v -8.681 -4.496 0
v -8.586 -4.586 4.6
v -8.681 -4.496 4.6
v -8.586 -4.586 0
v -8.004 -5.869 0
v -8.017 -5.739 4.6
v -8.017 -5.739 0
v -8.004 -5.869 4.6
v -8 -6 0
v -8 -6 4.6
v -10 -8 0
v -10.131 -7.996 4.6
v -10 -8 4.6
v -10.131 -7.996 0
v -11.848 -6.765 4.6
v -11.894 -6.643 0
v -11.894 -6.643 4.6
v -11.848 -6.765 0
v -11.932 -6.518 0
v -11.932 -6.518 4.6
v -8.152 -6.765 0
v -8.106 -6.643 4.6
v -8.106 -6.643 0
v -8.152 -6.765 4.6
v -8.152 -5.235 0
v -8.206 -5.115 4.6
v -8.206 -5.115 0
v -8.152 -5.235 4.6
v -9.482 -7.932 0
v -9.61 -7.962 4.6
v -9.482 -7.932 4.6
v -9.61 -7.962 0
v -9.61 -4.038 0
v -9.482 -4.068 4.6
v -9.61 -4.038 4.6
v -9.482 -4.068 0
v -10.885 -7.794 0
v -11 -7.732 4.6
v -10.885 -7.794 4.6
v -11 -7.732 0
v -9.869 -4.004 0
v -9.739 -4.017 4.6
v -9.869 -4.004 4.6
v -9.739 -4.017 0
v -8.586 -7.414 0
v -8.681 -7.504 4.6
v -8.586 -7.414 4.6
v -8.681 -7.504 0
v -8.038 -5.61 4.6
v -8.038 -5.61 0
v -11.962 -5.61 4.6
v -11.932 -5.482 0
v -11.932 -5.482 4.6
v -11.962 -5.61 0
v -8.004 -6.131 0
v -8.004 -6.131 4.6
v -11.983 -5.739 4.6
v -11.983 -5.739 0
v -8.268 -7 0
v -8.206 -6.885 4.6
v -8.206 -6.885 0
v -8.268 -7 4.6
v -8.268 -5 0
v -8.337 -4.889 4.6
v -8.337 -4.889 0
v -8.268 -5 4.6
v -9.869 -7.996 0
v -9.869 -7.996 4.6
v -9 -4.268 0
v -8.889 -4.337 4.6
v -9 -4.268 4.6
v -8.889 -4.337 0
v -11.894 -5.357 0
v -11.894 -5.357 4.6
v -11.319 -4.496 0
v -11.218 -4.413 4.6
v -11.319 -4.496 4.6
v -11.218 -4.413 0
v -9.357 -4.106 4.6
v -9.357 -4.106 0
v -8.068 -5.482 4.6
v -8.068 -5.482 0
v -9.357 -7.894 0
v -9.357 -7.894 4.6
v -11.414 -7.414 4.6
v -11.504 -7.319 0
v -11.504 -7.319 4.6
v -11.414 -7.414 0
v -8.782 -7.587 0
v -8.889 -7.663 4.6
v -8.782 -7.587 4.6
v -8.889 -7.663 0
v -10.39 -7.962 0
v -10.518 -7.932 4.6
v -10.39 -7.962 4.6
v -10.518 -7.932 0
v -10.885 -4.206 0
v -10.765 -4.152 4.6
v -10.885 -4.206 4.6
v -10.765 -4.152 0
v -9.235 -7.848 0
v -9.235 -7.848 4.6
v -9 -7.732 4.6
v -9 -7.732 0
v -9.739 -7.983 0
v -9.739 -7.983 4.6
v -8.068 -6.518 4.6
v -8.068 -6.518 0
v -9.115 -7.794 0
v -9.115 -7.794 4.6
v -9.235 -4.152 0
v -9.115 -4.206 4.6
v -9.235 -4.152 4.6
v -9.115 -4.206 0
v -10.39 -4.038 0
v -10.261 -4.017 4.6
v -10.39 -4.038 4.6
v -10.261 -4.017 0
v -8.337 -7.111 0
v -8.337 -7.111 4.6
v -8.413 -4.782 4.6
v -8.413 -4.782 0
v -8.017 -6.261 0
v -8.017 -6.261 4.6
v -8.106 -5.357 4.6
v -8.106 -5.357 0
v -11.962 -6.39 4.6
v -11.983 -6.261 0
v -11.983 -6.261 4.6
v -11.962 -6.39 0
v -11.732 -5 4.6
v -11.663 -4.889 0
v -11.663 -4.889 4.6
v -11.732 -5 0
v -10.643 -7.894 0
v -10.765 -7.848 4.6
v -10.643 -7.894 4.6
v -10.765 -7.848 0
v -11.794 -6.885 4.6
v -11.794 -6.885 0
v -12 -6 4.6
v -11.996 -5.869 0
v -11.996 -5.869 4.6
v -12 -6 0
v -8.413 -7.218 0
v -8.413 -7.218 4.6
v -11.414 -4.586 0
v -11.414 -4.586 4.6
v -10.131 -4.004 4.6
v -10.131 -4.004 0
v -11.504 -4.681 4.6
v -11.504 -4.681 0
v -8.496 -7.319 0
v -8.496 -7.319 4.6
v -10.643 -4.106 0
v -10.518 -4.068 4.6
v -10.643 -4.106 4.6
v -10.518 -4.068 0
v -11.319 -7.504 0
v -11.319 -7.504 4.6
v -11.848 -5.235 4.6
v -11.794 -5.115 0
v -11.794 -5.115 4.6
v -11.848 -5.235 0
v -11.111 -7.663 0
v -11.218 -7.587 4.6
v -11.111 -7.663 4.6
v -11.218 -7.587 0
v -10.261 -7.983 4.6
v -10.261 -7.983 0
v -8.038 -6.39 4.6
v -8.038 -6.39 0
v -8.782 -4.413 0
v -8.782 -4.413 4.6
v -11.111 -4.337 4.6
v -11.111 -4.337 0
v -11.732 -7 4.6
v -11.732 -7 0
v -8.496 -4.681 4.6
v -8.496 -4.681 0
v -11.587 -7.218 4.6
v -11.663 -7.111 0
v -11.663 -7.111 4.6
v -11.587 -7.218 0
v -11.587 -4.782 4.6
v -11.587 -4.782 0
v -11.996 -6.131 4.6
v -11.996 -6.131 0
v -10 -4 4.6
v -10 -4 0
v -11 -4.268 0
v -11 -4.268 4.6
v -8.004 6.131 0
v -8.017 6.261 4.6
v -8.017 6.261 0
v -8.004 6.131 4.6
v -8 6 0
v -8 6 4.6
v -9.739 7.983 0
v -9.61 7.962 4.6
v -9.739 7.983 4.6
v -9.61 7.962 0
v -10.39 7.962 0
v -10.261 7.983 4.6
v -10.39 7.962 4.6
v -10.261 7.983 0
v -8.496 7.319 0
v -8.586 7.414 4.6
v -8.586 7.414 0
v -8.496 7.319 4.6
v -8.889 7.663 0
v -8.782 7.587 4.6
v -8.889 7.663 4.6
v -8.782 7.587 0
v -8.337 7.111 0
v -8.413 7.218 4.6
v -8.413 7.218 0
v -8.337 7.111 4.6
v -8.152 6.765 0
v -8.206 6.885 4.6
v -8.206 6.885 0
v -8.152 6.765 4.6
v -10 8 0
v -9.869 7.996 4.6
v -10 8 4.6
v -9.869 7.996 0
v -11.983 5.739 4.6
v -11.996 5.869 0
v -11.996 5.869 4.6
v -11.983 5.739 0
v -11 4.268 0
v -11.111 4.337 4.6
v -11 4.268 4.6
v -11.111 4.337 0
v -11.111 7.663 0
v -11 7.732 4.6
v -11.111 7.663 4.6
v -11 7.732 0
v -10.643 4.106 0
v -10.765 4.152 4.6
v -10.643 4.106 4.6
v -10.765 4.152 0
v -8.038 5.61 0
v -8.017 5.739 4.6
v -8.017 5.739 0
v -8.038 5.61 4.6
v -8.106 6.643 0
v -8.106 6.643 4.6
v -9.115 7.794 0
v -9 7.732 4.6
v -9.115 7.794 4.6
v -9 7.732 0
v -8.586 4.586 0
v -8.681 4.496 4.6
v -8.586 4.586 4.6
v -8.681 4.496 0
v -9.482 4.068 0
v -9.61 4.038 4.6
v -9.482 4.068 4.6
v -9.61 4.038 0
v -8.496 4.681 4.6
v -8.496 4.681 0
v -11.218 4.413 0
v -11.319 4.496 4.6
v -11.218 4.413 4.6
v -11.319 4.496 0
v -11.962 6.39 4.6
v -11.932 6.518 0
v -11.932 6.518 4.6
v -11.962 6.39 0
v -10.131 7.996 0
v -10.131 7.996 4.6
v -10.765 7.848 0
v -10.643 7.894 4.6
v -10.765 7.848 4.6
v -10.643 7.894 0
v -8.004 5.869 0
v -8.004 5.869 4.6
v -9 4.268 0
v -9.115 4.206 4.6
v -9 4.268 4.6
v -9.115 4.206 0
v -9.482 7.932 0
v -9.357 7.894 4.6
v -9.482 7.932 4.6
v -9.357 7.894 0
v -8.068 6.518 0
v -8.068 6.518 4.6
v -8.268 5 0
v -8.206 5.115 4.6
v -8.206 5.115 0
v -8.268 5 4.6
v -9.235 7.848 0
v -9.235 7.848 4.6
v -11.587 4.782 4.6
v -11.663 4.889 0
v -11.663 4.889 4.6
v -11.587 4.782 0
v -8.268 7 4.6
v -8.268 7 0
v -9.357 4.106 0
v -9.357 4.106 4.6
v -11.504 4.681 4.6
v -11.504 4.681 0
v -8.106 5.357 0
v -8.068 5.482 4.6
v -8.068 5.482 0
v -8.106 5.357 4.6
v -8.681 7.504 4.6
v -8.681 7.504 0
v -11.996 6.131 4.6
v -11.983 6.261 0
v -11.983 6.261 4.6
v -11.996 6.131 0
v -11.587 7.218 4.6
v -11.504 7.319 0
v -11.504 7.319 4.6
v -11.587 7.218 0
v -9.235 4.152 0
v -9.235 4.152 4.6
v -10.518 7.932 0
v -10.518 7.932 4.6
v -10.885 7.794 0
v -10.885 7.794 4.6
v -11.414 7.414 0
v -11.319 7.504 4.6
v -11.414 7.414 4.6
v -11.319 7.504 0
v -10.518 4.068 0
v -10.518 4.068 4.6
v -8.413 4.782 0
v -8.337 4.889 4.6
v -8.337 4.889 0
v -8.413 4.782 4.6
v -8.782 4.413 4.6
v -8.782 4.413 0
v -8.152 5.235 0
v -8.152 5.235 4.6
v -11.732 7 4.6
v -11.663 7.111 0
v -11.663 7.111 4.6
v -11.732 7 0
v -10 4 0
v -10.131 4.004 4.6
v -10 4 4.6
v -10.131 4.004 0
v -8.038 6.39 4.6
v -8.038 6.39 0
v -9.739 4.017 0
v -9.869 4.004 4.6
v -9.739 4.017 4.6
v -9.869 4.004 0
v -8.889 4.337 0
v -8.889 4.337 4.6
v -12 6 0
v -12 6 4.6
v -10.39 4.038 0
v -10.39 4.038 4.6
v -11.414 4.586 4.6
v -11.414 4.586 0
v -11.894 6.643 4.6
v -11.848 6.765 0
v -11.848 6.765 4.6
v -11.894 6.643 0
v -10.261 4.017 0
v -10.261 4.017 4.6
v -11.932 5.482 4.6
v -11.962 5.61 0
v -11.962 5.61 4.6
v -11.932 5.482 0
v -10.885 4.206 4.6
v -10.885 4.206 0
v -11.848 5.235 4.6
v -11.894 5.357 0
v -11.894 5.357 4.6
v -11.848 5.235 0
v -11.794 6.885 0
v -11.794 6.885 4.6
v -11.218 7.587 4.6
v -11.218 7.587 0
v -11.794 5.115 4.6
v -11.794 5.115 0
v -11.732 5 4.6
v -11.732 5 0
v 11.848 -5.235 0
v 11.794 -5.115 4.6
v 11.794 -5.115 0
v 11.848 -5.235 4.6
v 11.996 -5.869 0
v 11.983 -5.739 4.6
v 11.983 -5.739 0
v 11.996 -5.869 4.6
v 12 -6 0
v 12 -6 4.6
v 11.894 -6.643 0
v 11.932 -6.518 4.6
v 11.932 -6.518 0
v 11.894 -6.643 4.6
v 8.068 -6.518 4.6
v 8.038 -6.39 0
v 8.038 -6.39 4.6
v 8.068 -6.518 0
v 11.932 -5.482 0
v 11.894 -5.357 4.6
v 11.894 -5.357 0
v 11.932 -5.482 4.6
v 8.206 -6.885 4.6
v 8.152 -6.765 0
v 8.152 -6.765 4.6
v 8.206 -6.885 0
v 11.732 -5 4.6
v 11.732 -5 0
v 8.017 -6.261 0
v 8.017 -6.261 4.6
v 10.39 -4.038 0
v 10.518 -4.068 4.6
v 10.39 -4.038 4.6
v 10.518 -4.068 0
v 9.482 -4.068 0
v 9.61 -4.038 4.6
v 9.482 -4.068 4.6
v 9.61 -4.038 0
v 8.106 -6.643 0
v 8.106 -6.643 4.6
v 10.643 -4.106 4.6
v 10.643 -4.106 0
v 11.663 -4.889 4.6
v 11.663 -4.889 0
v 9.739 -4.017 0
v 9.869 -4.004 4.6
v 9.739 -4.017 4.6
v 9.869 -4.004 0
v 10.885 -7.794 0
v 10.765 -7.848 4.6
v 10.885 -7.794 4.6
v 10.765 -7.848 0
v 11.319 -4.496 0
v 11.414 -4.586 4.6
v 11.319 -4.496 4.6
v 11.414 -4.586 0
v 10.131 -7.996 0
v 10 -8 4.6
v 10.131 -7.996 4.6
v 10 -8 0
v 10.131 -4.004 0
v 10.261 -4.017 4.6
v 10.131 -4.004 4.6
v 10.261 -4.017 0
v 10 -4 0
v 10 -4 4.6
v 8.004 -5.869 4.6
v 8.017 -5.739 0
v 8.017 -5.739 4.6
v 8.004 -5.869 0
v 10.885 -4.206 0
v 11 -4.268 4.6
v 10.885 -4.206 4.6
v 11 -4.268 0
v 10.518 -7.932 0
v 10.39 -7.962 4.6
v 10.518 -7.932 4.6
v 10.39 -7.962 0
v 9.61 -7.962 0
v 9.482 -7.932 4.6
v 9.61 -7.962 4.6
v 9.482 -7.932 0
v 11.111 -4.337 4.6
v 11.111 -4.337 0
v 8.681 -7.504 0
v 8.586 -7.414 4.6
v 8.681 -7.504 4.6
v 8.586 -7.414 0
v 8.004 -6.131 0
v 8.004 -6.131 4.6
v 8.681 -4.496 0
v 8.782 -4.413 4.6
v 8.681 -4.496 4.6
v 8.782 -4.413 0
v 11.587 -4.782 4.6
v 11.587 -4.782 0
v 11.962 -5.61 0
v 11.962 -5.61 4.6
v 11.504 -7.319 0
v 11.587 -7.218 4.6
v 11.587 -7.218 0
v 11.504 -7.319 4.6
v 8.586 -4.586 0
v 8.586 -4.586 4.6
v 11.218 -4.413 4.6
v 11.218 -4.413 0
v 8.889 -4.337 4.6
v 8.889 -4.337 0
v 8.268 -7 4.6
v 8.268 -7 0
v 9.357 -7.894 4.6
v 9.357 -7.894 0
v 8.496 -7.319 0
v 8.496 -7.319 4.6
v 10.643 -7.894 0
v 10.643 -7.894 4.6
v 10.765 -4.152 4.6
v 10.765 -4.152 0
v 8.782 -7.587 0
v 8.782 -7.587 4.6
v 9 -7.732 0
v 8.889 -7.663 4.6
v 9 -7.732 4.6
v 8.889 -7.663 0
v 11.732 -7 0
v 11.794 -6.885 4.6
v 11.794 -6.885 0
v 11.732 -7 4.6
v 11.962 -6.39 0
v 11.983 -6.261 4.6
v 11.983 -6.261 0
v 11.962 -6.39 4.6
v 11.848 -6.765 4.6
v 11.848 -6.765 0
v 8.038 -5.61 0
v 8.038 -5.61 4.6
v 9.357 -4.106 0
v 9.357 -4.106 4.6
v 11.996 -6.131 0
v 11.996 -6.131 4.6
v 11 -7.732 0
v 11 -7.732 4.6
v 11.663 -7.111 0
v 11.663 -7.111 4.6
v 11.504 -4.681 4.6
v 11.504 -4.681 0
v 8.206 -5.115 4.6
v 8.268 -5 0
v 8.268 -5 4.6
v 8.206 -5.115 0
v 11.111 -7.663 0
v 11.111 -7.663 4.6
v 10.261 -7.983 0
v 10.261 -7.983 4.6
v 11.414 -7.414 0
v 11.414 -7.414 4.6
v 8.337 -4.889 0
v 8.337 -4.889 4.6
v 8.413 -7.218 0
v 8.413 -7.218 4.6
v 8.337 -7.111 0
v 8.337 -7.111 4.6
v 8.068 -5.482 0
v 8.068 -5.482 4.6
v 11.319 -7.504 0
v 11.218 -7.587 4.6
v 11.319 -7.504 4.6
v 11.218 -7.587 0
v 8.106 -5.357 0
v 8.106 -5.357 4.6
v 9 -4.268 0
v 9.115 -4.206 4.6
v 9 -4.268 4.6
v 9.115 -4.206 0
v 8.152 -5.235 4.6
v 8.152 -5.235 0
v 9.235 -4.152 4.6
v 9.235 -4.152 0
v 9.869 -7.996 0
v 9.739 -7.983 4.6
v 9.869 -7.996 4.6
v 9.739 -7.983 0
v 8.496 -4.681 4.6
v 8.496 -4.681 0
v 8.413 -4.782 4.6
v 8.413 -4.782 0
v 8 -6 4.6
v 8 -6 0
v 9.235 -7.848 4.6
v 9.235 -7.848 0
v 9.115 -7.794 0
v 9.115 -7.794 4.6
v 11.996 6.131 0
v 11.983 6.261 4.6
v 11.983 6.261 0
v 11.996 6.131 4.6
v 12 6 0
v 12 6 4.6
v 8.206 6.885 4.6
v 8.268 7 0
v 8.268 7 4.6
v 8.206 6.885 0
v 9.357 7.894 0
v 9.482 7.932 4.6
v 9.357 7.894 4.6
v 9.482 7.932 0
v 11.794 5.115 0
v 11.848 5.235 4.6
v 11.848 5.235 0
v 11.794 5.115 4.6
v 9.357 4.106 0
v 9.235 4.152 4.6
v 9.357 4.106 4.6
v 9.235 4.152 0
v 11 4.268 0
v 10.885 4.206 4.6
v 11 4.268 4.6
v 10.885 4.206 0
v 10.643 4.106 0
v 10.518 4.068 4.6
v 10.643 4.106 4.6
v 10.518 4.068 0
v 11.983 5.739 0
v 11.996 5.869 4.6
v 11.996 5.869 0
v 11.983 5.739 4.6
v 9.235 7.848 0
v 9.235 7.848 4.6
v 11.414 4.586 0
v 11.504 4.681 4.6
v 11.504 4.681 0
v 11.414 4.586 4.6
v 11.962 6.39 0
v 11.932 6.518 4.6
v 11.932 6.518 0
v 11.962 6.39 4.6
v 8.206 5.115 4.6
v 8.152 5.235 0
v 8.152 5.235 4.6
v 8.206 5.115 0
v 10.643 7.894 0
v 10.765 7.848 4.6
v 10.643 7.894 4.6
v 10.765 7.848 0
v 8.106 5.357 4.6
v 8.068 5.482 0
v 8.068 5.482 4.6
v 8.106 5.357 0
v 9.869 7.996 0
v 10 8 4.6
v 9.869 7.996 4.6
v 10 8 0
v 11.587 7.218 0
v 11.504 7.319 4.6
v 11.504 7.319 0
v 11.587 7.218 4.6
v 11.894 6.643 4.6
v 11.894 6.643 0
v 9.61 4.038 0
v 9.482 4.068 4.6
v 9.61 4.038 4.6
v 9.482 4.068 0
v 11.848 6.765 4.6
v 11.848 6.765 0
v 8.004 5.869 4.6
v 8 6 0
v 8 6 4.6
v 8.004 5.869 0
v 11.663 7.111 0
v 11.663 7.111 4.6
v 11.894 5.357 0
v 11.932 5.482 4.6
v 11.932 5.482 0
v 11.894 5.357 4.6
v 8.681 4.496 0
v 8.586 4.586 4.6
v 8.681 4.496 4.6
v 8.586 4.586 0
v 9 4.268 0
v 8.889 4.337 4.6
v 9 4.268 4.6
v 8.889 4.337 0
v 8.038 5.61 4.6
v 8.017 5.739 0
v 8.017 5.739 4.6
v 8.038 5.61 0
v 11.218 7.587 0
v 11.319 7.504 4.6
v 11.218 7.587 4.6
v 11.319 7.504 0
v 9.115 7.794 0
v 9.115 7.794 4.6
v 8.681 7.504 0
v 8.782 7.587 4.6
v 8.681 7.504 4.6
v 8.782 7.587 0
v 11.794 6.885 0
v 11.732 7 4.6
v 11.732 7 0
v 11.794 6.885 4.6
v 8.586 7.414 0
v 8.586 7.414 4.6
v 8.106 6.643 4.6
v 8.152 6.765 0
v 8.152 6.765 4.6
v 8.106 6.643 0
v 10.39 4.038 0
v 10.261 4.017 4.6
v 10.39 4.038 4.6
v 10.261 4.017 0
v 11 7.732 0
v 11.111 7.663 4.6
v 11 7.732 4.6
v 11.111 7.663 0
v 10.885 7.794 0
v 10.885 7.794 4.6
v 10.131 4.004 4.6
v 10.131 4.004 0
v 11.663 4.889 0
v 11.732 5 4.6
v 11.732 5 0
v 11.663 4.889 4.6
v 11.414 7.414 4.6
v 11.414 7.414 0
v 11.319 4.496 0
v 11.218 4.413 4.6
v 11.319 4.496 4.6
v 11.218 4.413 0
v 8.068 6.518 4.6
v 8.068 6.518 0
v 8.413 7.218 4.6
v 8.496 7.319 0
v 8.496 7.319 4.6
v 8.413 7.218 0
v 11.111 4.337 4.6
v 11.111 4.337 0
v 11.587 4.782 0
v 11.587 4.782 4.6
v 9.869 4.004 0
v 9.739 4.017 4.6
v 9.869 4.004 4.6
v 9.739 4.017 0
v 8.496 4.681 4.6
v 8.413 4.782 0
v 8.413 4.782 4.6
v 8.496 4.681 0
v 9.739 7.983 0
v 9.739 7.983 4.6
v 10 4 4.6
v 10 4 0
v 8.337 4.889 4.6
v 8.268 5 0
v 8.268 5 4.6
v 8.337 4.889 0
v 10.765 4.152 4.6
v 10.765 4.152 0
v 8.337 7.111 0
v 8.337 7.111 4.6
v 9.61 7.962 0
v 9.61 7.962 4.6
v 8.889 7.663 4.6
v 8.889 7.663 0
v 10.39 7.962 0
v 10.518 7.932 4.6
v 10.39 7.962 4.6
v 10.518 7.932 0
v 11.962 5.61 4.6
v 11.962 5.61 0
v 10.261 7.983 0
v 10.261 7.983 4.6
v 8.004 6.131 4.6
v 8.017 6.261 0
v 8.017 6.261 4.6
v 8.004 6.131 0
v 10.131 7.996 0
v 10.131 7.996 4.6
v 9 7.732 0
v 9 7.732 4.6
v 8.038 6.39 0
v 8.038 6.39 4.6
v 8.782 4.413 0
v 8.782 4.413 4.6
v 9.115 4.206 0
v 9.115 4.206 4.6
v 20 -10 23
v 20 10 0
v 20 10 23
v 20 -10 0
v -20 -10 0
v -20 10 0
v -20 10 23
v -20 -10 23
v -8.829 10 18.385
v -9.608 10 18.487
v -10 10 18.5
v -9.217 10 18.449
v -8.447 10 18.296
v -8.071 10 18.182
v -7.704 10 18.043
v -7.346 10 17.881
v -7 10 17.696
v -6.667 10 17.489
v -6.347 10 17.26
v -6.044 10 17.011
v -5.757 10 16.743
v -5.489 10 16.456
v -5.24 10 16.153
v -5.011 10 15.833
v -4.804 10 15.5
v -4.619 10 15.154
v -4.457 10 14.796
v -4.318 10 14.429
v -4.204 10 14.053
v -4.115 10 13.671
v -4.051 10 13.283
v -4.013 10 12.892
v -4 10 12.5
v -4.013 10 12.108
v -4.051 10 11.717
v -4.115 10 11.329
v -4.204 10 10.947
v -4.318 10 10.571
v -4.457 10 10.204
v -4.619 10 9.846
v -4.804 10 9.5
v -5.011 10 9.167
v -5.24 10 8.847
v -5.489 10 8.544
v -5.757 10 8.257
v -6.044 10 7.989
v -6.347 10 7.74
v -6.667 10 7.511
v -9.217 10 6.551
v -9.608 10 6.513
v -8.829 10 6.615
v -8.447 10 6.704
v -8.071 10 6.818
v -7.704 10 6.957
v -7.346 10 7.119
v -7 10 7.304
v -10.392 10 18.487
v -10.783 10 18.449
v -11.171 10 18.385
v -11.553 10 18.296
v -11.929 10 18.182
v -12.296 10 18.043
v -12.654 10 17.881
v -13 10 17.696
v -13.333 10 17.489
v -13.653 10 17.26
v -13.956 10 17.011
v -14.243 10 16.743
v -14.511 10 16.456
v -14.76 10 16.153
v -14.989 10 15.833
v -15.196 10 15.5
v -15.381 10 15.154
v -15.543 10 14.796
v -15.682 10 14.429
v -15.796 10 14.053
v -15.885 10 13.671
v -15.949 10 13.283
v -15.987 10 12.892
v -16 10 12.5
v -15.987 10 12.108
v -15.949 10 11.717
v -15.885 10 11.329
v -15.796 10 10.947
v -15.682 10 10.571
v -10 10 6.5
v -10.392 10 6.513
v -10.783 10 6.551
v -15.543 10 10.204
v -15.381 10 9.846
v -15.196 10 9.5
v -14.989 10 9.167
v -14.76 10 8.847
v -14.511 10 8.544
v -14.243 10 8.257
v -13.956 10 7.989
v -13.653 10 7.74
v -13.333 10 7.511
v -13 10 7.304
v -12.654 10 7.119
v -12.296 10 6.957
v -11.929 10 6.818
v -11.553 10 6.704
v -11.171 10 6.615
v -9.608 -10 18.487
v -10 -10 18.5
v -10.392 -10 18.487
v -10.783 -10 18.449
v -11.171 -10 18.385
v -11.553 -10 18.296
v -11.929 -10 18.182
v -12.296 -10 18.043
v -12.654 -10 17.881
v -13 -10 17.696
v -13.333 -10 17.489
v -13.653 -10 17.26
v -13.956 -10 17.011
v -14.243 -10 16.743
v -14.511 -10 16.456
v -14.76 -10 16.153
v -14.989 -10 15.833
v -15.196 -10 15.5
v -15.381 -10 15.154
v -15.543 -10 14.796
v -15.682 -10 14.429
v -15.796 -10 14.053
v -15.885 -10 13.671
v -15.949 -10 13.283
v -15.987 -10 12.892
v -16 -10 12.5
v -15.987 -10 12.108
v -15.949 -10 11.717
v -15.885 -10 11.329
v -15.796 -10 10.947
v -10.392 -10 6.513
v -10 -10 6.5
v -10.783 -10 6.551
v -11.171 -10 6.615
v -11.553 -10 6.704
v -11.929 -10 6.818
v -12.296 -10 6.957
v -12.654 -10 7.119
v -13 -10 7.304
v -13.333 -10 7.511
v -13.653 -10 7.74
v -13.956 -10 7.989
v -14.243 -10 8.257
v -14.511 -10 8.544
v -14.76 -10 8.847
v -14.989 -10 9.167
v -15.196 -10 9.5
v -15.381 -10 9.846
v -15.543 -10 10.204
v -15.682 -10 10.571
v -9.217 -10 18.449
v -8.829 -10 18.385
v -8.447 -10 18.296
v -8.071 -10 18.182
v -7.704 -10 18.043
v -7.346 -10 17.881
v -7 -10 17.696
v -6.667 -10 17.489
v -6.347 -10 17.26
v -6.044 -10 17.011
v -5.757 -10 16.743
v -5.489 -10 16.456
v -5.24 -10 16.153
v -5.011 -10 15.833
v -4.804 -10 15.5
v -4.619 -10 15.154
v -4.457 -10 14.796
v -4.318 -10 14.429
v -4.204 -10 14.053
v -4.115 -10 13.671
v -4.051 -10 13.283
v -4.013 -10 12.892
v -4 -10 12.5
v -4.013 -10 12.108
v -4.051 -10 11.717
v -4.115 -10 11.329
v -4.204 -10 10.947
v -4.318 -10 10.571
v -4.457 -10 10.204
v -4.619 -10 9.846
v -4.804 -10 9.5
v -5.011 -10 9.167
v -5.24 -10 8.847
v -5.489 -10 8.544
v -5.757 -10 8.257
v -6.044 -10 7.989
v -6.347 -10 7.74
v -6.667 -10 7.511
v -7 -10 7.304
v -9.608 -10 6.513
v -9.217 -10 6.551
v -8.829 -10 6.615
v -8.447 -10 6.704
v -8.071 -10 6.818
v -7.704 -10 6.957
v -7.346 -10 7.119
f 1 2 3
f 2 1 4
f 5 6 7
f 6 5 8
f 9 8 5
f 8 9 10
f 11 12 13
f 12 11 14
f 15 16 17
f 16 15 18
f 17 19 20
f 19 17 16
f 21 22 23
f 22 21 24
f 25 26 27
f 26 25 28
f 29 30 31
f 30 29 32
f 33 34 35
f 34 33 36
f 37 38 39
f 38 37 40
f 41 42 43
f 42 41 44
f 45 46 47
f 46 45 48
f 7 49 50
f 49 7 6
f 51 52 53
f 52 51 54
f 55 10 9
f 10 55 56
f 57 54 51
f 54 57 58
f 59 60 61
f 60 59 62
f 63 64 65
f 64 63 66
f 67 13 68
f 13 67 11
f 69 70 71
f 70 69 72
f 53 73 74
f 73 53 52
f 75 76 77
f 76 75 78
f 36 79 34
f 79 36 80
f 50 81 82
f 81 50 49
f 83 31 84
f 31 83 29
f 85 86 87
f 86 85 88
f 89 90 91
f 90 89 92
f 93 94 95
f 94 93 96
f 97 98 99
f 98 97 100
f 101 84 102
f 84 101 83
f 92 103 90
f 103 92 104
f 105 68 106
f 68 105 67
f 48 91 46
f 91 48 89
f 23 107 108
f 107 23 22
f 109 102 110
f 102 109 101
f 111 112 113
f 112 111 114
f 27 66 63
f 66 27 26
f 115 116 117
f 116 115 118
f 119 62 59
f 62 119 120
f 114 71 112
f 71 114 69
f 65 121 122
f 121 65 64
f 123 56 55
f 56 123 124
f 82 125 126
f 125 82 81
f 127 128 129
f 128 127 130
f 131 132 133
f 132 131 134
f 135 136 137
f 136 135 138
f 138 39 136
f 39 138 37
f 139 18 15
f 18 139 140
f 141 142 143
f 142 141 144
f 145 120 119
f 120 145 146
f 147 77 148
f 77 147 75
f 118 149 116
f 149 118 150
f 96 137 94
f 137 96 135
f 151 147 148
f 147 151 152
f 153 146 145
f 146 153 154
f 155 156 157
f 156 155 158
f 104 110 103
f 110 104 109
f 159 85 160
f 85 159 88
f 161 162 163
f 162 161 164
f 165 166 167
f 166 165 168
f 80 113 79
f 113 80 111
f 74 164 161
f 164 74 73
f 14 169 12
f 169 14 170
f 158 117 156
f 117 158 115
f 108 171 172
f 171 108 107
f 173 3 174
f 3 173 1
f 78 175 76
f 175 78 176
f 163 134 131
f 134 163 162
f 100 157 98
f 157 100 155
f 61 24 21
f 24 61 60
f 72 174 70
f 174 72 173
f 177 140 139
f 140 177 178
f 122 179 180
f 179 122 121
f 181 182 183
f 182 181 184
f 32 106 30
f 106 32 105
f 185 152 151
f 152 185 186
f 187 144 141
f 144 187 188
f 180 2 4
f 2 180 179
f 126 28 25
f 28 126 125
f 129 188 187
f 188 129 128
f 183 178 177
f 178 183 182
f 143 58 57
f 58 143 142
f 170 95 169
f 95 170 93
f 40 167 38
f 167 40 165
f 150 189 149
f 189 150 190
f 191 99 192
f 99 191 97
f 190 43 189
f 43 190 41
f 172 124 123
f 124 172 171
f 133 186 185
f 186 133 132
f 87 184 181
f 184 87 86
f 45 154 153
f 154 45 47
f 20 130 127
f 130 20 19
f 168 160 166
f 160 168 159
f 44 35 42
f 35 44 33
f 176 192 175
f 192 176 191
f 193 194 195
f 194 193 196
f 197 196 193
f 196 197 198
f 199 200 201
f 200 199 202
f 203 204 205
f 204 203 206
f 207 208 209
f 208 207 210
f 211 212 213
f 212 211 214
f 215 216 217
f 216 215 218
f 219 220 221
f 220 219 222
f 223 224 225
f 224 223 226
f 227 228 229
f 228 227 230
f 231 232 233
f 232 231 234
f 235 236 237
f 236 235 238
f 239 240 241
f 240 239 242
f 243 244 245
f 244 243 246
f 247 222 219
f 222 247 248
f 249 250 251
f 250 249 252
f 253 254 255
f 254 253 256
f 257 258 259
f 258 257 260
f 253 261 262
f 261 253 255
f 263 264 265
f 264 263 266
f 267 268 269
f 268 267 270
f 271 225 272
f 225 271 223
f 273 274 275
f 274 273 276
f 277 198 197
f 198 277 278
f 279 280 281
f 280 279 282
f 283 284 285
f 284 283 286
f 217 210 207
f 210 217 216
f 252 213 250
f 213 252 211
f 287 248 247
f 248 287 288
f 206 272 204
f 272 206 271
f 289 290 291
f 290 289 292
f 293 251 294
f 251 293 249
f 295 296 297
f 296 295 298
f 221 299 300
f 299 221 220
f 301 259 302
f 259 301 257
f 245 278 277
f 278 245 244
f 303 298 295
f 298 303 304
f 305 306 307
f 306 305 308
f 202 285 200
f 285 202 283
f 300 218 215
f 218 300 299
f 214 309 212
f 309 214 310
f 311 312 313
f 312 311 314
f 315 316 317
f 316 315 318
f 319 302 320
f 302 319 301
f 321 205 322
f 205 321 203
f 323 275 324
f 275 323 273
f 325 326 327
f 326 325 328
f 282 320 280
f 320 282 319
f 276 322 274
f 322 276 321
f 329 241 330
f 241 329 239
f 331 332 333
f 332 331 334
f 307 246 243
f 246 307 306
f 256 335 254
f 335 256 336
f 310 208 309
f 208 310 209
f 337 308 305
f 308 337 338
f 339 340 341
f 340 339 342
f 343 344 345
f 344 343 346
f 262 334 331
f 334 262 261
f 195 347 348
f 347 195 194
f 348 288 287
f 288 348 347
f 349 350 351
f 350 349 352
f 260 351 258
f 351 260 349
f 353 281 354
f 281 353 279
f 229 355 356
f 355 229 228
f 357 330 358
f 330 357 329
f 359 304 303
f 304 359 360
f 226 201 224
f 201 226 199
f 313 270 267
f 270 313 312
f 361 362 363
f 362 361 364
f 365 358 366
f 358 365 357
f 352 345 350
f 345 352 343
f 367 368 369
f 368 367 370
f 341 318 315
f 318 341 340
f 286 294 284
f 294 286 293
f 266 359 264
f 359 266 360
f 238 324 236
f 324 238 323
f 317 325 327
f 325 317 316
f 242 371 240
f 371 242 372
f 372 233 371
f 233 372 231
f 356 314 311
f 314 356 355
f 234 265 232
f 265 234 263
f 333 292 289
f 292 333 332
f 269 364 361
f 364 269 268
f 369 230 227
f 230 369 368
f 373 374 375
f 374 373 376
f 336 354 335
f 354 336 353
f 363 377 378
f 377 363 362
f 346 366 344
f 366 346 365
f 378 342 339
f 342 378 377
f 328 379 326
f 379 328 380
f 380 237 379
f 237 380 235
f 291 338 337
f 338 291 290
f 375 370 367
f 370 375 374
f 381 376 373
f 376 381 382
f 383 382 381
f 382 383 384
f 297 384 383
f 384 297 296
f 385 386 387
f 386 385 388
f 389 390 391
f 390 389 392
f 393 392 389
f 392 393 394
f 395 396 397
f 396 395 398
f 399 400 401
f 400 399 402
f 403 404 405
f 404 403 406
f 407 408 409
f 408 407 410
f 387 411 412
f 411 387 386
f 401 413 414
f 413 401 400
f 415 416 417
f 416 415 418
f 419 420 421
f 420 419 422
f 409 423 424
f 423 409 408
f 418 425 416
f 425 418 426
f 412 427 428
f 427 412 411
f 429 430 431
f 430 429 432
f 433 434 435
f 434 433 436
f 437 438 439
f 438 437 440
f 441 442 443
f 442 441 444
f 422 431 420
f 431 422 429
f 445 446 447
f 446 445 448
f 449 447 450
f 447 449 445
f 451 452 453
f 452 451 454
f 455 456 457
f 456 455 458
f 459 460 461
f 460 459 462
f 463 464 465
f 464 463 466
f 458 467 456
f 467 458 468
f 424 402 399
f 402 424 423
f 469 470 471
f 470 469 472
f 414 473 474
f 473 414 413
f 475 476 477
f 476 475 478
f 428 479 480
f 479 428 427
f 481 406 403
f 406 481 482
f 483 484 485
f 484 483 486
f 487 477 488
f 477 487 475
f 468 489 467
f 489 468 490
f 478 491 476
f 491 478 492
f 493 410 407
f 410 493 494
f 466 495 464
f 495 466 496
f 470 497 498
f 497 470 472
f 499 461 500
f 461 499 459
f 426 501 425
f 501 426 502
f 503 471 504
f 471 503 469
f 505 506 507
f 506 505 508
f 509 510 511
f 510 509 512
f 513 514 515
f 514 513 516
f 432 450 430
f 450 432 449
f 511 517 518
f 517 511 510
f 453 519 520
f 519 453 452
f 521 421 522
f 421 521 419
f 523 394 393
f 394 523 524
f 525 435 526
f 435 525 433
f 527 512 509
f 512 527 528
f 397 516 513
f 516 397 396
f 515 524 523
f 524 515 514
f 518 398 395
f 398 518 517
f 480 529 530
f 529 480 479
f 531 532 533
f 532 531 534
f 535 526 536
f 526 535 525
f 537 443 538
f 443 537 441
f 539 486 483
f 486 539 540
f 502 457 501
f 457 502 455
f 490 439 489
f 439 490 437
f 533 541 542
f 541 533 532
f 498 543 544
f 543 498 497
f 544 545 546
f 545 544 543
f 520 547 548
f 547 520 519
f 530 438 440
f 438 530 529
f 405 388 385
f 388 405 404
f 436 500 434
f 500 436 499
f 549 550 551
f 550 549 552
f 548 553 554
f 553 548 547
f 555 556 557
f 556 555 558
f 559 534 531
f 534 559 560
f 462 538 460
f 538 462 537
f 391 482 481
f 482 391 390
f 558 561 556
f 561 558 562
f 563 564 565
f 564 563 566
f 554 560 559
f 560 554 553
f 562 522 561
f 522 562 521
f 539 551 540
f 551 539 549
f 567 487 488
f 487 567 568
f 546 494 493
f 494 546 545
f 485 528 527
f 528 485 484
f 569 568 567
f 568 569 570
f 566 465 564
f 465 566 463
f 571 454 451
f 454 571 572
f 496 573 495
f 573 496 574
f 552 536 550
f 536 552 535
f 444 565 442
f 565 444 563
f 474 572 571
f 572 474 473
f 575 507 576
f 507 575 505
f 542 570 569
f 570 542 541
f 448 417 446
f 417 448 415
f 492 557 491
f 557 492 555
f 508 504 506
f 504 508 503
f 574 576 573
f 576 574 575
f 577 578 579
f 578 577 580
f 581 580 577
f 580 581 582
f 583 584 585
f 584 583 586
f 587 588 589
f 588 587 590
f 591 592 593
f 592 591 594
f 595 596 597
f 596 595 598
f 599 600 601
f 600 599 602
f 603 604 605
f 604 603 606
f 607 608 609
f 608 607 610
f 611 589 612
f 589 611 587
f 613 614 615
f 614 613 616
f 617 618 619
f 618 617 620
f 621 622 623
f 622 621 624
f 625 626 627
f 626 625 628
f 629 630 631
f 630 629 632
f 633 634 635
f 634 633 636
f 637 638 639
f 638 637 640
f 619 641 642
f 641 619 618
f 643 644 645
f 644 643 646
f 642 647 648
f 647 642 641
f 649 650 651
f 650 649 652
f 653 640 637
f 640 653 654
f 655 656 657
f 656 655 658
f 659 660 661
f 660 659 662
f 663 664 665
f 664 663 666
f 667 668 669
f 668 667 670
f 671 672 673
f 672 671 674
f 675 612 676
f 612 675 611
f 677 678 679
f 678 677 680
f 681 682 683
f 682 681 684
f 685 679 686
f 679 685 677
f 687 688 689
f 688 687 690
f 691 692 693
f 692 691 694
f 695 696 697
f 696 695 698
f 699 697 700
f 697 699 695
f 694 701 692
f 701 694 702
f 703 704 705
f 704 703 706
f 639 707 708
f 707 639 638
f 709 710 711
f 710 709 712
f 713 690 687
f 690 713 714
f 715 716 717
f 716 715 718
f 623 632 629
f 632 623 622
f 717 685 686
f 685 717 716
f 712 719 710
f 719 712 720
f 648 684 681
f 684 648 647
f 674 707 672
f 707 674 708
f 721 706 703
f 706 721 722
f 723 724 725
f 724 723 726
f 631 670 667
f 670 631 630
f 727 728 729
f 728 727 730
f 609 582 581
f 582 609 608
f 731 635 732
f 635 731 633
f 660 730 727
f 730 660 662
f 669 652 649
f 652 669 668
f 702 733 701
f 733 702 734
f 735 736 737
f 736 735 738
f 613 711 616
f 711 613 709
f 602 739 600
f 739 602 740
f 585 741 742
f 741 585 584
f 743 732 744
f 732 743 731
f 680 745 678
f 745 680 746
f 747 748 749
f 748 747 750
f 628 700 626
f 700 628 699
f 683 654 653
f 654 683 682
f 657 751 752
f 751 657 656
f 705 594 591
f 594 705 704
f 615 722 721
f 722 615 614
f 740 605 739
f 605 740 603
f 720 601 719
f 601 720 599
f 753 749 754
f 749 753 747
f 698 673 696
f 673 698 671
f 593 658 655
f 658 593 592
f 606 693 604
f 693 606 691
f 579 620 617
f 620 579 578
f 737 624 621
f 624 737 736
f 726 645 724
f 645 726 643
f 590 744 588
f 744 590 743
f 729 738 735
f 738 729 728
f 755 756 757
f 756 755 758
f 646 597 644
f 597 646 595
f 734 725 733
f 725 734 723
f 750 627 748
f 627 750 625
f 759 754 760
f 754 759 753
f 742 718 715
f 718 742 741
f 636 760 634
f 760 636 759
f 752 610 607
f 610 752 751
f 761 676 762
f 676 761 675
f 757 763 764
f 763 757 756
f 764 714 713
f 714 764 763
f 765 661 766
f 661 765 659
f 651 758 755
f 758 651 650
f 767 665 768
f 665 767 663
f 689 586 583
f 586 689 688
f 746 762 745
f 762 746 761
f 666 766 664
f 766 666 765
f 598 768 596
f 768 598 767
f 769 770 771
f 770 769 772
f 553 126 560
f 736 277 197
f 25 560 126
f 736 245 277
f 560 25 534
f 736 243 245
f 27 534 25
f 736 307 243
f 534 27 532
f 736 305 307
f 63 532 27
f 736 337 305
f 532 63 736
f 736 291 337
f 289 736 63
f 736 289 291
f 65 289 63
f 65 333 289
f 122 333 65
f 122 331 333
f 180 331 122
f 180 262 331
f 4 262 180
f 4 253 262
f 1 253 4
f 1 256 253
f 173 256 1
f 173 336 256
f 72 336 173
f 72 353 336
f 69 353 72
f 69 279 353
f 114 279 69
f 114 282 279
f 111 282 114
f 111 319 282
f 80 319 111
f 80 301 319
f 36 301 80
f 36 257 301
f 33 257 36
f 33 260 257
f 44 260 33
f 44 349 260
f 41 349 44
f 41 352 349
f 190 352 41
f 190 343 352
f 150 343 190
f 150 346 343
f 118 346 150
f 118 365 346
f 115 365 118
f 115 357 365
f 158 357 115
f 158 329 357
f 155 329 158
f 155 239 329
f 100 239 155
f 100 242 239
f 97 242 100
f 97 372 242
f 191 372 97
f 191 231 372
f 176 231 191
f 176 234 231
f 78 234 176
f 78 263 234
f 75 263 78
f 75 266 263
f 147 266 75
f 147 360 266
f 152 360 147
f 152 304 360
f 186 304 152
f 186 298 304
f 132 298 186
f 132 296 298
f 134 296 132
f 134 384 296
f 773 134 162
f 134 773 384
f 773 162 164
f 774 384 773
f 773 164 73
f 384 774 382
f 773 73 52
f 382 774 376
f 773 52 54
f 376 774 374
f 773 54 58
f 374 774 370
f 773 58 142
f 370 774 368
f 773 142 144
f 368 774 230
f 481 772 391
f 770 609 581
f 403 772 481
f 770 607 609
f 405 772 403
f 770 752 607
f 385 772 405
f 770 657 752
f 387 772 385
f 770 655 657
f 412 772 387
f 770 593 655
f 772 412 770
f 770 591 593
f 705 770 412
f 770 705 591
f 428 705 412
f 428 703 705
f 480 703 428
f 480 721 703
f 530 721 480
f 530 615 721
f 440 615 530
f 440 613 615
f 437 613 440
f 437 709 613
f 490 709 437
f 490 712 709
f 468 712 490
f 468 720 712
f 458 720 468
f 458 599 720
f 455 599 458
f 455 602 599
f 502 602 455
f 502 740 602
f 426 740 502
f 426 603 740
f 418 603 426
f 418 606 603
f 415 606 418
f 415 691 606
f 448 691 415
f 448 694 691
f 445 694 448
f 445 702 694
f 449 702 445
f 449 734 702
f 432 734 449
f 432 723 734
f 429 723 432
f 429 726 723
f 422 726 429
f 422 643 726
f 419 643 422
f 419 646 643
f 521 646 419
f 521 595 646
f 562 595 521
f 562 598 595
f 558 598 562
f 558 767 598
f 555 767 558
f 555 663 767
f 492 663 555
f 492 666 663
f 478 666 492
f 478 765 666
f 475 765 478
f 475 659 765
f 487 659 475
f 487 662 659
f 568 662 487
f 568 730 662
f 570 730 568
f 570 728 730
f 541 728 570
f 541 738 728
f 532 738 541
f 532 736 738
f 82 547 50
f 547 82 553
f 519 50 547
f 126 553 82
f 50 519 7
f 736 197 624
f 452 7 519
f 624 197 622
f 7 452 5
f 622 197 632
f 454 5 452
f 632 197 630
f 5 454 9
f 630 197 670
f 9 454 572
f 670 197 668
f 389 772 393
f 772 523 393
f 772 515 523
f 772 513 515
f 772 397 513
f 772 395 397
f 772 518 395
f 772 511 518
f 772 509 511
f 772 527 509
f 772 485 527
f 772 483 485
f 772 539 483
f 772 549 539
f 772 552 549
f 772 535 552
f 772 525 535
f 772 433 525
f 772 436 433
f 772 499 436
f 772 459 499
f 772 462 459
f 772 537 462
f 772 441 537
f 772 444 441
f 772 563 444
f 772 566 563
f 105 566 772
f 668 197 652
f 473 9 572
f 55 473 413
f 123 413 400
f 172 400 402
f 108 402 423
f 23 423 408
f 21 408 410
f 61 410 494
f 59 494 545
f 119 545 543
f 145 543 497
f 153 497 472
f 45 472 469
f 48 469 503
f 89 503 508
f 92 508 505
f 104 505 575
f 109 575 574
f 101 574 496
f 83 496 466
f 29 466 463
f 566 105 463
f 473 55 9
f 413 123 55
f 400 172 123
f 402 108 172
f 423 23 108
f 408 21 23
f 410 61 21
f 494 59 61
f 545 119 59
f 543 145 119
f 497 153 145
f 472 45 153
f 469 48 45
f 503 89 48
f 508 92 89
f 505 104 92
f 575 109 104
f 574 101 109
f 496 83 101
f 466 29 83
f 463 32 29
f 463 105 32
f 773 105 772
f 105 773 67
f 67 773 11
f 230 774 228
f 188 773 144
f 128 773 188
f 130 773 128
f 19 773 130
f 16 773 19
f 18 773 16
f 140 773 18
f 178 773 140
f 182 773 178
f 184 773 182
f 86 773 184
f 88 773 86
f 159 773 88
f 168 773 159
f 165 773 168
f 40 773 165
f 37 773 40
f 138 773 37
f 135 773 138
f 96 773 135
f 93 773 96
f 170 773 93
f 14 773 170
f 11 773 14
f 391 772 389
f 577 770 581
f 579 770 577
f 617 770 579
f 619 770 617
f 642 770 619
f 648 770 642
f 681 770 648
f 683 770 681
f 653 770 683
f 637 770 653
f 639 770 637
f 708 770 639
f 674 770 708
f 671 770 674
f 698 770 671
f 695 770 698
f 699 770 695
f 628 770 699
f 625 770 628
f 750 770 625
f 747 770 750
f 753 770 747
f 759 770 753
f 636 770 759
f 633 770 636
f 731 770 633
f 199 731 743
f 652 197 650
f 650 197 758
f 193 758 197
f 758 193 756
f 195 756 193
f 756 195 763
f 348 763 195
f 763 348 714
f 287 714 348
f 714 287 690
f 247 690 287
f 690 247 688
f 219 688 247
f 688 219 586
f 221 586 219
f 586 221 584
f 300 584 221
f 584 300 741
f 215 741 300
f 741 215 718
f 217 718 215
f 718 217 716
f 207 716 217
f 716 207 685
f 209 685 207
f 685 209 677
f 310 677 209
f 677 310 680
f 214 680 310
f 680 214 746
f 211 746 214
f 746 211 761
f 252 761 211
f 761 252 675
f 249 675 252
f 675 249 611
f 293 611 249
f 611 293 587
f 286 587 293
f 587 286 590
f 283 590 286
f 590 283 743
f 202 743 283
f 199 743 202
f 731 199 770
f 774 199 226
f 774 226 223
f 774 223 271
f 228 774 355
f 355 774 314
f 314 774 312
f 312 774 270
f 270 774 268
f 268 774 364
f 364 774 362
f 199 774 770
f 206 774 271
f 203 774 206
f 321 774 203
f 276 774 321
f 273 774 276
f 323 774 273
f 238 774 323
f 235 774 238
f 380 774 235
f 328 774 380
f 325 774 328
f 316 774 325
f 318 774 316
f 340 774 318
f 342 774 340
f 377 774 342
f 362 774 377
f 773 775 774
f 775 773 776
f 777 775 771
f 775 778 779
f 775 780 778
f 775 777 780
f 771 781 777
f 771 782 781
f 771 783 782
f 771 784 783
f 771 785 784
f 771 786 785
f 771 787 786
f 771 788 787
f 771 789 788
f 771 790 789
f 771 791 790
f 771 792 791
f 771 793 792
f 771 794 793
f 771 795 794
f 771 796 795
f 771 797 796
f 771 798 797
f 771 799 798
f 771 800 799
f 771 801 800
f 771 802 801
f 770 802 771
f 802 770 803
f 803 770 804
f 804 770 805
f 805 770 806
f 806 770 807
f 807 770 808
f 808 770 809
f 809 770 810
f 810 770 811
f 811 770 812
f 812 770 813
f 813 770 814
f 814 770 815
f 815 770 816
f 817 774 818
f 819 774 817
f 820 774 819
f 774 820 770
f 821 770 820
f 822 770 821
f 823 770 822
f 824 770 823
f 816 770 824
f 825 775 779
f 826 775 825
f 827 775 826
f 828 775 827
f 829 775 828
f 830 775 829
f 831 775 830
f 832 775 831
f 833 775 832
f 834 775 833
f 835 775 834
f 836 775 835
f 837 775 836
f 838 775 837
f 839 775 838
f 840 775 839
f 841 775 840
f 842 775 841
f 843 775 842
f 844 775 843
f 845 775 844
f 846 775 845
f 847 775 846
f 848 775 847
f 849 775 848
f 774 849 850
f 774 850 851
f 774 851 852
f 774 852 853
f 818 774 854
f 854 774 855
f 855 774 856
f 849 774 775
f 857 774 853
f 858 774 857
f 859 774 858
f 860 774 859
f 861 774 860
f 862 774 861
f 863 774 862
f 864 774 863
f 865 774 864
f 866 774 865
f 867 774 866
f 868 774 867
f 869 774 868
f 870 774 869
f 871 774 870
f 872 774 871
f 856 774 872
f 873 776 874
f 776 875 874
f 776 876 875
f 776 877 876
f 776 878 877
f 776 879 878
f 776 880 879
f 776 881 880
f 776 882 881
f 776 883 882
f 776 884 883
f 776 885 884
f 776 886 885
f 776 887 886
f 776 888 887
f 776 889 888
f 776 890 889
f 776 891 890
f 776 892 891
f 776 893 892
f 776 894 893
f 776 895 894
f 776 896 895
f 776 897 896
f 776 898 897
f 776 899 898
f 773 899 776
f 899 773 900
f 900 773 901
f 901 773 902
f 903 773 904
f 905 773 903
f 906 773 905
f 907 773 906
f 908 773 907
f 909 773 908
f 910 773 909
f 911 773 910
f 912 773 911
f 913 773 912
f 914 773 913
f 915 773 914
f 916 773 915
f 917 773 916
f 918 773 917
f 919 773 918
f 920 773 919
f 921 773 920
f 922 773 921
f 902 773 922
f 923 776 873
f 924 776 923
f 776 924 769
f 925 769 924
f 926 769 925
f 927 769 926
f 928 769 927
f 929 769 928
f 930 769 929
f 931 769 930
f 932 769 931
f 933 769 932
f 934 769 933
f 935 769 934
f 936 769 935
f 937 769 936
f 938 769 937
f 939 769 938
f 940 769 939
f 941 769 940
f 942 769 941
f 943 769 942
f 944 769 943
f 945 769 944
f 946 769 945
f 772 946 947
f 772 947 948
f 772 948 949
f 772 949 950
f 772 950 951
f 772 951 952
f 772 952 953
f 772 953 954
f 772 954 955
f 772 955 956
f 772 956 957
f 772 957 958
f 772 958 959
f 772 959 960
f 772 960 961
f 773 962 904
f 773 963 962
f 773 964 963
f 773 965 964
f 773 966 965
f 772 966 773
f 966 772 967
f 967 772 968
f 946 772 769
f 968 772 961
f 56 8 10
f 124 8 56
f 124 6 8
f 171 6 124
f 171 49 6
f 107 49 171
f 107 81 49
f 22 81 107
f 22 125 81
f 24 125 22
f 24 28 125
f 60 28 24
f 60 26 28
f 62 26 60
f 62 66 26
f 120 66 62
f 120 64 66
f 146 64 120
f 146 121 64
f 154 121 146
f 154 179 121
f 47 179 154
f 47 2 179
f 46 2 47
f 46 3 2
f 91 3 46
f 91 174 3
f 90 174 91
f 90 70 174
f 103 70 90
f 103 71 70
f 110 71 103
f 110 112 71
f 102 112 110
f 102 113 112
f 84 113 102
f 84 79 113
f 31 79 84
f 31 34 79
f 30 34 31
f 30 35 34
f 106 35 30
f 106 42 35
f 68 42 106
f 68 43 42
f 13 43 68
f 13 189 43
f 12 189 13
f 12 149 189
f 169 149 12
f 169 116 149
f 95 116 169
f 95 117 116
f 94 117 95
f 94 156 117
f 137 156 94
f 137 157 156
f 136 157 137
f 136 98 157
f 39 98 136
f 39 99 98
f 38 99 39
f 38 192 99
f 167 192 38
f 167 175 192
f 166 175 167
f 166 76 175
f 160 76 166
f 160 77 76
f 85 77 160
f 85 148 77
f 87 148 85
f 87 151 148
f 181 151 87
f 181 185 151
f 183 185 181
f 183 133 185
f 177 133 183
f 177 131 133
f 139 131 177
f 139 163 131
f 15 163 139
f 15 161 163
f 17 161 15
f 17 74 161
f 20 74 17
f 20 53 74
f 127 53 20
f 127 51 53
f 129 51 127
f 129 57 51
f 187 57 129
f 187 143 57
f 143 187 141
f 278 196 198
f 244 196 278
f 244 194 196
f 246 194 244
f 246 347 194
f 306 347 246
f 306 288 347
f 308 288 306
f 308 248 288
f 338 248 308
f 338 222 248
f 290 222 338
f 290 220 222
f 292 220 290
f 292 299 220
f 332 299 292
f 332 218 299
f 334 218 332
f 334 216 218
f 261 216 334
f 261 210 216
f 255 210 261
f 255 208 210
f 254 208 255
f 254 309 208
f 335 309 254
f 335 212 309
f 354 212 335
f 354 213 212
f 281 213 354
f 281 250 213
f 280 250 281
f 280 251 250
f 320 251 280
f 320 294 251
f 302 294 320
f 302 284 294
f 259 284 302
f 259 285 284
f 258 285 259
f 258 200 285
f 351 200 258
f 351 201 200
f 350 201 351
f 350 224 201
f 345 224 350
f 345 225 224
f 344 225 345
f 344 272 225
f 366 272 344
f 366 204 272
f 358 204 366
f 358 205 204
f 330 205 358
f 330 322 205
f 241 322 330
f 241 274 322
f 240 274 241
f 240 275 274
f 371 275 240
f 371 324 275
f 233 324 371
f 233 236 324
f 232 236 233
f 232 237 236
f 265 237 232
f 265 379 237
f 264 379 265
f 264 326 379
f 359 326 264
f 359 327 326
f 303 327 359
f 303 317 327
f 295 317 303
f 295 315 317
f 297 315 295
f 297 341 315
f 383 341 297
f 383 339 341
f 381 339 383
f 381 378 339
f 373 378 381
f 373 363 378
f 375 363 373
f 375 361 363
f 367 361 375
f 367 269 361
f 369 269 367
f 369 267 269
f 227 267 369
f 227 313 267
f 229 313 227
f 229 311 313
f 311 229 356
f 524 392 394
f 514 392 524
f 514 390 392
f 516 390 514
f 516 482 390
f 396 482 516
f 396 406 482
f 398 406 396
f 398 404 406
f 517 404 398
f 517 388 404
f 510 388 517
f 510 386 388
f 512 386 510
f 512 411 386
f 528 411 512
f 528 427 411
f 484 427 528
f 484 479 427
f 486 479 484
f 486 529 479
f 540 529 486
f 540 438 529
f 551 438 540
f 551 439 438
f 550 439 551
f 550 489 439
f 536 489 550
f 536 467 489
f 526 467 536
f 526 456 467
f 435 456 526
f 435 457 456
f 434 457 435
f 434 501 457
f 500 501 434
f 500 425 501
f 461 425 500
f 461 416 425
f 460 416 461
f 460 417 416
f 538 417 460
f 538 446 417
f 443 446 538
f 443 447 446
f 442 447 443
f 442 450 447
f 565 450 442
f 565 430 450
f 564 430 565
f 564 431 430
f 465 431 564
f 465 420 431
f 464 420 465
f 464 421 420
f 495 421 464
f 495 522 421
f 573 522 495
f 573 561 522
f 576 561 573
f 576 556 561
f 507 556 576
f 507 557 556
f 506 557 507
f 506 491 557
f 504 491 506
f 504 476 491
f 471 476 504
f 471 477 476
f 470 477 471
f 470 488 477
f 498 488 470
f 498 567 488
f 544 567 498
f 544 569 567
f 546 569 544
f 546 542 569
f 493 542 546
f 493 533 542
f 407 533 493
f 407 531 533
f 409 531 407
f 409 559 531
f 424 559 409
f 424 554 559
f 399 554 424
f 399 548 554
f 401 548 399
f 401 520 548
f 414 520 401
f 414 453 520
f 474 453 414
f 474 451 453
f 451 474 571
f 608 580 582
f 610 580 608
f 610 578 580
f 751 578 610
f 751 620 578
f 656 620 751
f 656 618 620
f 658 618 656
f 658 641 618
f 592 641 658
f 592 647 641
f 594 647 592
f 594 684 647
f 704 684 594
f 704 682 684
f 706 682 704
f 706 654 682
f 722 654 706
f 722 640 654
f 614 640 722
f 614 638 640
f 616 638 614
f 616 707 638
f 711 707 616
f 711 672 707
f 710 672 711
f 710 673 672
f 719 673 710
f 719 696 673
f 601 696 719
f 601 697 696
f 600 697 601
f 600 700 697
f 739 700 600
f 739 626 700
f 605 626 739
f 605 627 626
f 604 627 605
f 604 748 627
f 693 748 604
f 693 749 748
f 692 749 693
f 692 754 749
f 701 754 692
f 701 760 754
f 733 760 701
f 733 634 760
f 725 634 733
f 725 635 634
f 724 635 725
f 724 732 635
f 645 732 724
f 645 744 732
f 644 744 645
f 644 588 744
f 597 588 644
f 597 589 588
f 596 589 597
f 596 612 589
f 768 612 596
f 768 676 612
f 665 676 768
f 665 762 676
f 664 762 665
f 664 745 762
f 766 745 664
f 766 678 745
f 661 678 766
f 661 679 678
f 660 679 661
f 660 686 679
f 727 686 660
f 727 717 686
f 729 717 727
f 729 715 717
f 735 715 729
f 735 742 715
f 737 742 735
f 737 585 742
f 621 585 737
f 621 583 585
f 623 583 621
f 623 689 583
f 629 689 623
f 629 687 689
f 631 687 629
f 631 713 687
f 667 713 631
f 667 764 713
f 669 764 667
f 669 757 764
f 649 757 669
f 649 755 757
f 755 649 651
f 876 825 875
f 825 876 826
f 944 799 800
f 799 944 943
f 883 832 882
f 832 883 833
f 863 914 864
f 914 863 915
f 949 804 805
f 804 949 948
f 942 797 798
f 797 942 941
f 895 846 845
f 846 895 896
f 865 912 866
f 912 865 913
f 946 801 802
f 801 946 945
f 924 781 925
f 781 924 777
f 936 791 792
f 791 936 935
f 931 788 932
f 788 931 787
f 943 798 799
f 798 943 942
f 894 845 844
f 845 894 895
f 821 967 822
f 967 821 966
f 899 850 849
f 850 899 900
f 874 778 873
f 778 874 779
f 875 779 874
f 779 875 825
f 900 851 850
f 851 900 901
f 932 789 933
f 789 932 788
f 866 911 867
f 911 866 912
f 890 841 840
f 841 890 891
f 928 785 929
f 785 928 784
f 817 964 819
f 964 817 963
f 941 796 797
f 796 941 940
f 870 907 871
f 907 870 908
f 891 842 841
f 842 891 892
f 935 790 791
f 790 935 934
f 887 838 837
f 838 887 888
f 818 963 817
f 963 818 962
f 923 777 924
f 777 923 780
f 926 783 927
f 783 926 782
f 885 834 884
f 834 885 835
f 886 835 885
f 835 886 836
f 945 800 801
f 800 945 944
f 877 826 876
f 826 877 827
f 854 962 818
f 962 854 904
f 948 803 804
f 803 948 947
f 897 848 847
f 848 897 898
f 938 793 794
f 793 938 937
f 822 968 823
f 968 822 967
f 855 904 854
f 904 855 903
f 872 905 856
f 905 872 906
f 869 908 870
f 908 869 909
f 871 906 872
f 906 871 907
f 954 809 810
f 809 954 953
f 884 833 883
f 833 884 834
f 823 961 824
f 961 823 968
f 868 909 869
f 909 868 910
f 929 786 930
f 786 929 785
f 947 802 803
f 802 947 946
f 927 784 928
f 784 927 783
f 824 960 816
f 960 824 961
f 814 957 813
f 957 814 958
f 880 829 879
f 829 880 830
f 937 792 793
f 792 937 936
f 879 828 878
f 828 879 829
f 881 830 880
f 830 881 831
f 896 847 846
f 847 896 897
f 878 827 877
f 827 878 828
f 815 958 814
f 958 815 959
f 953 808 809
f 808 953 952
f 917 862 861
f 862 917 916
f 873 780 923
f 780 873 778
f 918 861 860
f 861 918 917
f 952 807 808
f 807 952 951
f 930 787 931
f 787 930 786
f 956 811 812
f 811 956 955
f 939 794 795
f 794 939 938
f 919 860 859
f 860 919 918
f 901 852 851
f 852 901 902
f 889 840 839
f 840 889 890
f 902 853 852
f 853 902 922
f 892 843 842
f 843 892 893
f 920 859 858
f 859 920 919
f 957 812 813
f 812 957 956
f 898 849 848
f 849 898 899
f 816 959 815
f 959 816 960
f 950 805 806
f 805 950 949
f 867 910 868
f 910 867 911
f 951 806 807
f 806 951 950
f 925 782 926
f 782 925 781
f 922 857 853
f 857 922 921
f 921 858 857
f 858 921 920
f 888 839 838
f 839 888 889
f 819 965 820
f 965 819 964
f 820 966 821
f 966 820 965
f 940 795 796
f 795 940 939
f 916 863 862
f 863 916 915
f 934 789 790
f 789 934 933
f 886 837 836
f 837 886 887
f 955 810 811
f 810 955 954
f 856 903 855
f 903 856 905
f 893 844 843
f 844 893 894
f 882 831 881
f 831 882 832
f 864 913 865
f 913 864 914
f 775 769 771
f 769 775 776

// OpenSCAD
$fn = 96;

// Parameters
rod_diameter = 12.0;
bracket_height = 23.0;

base_thickness = 5.0;
base_length = 40.0;
base_width  = 20.0;

mounting_hole_diameter = 4.0;
mounting_hole_offset_x = 10.0;   // from center along length
mounting_hole_offset_y = 6.0;    // from center along width

clamp_thickness = 3.0;           // top cap thickness
wall = 4.0;                      // material around rod
overlap = 0.2;                   // small overlap for robust unions/differences

// Derived
rod_r   = rod_diameter/2;
outer_r = rod_r + wall;

// Ensure total height matches bracket_height exactly
cradle_h = bracket_height - base_thickness - clamp_thickness;

// Rod axis along Y, placed near one end in X, centered in Z within cradle
rod_center_x = -(base_length/2 - outer_r);
rod_center_z = base_thickness + cradle_h/2;

// Base block with mounting holes
module base_block() {
    difference() {
        translate([0, 0, base_thickness/2])
            cube([base_length, base_width, base_thickness], center=true);

        for (sx = [-1, 1], sy = [-1, 1])
            translate([sx*mounting_hole_offset_x, sy*mounting_hole_offset_y, base_thickness/2])
                cylinder(h=base_thickness + 2*overlap, d=mounting_hole_diameter, center=true);
    }
}

// Cradle body with rod cutout
module rod_support_cradle() {
    difference() {
        // Cradle sits directly on top of base and ends just below the cap
        translate([0, 0, base_thickness + cradle_h/2 - overlap])
            cube([base_length, base_width, cradle_h + 2*overlap], center=true);

        // Rod cutout (axis along Y)
        translate([rod_center_x, 0, rod_center_z])
            rotate([90, 0, 0])
                cylinder(h=base_width + 2*overlap, r=rod_r, center=true);
    }
}

// Top retention cap (connected to cradle with slight overlap)
module rod_retention_feature() {
    translate([0, 0, base_thickness + cradle_h + clamp_thickness/2 - overlap])
        cube([base_length, base_width, clamp_thickness + 2*overlap], center=true);
}

// Assemble the bracket as ONE connected solid
module shaft_support_bracket() {
    union() {
        base_block();
        rod_support_cradle();
        rod_retention_feature();
    }
}

shaft_support_bracket();
